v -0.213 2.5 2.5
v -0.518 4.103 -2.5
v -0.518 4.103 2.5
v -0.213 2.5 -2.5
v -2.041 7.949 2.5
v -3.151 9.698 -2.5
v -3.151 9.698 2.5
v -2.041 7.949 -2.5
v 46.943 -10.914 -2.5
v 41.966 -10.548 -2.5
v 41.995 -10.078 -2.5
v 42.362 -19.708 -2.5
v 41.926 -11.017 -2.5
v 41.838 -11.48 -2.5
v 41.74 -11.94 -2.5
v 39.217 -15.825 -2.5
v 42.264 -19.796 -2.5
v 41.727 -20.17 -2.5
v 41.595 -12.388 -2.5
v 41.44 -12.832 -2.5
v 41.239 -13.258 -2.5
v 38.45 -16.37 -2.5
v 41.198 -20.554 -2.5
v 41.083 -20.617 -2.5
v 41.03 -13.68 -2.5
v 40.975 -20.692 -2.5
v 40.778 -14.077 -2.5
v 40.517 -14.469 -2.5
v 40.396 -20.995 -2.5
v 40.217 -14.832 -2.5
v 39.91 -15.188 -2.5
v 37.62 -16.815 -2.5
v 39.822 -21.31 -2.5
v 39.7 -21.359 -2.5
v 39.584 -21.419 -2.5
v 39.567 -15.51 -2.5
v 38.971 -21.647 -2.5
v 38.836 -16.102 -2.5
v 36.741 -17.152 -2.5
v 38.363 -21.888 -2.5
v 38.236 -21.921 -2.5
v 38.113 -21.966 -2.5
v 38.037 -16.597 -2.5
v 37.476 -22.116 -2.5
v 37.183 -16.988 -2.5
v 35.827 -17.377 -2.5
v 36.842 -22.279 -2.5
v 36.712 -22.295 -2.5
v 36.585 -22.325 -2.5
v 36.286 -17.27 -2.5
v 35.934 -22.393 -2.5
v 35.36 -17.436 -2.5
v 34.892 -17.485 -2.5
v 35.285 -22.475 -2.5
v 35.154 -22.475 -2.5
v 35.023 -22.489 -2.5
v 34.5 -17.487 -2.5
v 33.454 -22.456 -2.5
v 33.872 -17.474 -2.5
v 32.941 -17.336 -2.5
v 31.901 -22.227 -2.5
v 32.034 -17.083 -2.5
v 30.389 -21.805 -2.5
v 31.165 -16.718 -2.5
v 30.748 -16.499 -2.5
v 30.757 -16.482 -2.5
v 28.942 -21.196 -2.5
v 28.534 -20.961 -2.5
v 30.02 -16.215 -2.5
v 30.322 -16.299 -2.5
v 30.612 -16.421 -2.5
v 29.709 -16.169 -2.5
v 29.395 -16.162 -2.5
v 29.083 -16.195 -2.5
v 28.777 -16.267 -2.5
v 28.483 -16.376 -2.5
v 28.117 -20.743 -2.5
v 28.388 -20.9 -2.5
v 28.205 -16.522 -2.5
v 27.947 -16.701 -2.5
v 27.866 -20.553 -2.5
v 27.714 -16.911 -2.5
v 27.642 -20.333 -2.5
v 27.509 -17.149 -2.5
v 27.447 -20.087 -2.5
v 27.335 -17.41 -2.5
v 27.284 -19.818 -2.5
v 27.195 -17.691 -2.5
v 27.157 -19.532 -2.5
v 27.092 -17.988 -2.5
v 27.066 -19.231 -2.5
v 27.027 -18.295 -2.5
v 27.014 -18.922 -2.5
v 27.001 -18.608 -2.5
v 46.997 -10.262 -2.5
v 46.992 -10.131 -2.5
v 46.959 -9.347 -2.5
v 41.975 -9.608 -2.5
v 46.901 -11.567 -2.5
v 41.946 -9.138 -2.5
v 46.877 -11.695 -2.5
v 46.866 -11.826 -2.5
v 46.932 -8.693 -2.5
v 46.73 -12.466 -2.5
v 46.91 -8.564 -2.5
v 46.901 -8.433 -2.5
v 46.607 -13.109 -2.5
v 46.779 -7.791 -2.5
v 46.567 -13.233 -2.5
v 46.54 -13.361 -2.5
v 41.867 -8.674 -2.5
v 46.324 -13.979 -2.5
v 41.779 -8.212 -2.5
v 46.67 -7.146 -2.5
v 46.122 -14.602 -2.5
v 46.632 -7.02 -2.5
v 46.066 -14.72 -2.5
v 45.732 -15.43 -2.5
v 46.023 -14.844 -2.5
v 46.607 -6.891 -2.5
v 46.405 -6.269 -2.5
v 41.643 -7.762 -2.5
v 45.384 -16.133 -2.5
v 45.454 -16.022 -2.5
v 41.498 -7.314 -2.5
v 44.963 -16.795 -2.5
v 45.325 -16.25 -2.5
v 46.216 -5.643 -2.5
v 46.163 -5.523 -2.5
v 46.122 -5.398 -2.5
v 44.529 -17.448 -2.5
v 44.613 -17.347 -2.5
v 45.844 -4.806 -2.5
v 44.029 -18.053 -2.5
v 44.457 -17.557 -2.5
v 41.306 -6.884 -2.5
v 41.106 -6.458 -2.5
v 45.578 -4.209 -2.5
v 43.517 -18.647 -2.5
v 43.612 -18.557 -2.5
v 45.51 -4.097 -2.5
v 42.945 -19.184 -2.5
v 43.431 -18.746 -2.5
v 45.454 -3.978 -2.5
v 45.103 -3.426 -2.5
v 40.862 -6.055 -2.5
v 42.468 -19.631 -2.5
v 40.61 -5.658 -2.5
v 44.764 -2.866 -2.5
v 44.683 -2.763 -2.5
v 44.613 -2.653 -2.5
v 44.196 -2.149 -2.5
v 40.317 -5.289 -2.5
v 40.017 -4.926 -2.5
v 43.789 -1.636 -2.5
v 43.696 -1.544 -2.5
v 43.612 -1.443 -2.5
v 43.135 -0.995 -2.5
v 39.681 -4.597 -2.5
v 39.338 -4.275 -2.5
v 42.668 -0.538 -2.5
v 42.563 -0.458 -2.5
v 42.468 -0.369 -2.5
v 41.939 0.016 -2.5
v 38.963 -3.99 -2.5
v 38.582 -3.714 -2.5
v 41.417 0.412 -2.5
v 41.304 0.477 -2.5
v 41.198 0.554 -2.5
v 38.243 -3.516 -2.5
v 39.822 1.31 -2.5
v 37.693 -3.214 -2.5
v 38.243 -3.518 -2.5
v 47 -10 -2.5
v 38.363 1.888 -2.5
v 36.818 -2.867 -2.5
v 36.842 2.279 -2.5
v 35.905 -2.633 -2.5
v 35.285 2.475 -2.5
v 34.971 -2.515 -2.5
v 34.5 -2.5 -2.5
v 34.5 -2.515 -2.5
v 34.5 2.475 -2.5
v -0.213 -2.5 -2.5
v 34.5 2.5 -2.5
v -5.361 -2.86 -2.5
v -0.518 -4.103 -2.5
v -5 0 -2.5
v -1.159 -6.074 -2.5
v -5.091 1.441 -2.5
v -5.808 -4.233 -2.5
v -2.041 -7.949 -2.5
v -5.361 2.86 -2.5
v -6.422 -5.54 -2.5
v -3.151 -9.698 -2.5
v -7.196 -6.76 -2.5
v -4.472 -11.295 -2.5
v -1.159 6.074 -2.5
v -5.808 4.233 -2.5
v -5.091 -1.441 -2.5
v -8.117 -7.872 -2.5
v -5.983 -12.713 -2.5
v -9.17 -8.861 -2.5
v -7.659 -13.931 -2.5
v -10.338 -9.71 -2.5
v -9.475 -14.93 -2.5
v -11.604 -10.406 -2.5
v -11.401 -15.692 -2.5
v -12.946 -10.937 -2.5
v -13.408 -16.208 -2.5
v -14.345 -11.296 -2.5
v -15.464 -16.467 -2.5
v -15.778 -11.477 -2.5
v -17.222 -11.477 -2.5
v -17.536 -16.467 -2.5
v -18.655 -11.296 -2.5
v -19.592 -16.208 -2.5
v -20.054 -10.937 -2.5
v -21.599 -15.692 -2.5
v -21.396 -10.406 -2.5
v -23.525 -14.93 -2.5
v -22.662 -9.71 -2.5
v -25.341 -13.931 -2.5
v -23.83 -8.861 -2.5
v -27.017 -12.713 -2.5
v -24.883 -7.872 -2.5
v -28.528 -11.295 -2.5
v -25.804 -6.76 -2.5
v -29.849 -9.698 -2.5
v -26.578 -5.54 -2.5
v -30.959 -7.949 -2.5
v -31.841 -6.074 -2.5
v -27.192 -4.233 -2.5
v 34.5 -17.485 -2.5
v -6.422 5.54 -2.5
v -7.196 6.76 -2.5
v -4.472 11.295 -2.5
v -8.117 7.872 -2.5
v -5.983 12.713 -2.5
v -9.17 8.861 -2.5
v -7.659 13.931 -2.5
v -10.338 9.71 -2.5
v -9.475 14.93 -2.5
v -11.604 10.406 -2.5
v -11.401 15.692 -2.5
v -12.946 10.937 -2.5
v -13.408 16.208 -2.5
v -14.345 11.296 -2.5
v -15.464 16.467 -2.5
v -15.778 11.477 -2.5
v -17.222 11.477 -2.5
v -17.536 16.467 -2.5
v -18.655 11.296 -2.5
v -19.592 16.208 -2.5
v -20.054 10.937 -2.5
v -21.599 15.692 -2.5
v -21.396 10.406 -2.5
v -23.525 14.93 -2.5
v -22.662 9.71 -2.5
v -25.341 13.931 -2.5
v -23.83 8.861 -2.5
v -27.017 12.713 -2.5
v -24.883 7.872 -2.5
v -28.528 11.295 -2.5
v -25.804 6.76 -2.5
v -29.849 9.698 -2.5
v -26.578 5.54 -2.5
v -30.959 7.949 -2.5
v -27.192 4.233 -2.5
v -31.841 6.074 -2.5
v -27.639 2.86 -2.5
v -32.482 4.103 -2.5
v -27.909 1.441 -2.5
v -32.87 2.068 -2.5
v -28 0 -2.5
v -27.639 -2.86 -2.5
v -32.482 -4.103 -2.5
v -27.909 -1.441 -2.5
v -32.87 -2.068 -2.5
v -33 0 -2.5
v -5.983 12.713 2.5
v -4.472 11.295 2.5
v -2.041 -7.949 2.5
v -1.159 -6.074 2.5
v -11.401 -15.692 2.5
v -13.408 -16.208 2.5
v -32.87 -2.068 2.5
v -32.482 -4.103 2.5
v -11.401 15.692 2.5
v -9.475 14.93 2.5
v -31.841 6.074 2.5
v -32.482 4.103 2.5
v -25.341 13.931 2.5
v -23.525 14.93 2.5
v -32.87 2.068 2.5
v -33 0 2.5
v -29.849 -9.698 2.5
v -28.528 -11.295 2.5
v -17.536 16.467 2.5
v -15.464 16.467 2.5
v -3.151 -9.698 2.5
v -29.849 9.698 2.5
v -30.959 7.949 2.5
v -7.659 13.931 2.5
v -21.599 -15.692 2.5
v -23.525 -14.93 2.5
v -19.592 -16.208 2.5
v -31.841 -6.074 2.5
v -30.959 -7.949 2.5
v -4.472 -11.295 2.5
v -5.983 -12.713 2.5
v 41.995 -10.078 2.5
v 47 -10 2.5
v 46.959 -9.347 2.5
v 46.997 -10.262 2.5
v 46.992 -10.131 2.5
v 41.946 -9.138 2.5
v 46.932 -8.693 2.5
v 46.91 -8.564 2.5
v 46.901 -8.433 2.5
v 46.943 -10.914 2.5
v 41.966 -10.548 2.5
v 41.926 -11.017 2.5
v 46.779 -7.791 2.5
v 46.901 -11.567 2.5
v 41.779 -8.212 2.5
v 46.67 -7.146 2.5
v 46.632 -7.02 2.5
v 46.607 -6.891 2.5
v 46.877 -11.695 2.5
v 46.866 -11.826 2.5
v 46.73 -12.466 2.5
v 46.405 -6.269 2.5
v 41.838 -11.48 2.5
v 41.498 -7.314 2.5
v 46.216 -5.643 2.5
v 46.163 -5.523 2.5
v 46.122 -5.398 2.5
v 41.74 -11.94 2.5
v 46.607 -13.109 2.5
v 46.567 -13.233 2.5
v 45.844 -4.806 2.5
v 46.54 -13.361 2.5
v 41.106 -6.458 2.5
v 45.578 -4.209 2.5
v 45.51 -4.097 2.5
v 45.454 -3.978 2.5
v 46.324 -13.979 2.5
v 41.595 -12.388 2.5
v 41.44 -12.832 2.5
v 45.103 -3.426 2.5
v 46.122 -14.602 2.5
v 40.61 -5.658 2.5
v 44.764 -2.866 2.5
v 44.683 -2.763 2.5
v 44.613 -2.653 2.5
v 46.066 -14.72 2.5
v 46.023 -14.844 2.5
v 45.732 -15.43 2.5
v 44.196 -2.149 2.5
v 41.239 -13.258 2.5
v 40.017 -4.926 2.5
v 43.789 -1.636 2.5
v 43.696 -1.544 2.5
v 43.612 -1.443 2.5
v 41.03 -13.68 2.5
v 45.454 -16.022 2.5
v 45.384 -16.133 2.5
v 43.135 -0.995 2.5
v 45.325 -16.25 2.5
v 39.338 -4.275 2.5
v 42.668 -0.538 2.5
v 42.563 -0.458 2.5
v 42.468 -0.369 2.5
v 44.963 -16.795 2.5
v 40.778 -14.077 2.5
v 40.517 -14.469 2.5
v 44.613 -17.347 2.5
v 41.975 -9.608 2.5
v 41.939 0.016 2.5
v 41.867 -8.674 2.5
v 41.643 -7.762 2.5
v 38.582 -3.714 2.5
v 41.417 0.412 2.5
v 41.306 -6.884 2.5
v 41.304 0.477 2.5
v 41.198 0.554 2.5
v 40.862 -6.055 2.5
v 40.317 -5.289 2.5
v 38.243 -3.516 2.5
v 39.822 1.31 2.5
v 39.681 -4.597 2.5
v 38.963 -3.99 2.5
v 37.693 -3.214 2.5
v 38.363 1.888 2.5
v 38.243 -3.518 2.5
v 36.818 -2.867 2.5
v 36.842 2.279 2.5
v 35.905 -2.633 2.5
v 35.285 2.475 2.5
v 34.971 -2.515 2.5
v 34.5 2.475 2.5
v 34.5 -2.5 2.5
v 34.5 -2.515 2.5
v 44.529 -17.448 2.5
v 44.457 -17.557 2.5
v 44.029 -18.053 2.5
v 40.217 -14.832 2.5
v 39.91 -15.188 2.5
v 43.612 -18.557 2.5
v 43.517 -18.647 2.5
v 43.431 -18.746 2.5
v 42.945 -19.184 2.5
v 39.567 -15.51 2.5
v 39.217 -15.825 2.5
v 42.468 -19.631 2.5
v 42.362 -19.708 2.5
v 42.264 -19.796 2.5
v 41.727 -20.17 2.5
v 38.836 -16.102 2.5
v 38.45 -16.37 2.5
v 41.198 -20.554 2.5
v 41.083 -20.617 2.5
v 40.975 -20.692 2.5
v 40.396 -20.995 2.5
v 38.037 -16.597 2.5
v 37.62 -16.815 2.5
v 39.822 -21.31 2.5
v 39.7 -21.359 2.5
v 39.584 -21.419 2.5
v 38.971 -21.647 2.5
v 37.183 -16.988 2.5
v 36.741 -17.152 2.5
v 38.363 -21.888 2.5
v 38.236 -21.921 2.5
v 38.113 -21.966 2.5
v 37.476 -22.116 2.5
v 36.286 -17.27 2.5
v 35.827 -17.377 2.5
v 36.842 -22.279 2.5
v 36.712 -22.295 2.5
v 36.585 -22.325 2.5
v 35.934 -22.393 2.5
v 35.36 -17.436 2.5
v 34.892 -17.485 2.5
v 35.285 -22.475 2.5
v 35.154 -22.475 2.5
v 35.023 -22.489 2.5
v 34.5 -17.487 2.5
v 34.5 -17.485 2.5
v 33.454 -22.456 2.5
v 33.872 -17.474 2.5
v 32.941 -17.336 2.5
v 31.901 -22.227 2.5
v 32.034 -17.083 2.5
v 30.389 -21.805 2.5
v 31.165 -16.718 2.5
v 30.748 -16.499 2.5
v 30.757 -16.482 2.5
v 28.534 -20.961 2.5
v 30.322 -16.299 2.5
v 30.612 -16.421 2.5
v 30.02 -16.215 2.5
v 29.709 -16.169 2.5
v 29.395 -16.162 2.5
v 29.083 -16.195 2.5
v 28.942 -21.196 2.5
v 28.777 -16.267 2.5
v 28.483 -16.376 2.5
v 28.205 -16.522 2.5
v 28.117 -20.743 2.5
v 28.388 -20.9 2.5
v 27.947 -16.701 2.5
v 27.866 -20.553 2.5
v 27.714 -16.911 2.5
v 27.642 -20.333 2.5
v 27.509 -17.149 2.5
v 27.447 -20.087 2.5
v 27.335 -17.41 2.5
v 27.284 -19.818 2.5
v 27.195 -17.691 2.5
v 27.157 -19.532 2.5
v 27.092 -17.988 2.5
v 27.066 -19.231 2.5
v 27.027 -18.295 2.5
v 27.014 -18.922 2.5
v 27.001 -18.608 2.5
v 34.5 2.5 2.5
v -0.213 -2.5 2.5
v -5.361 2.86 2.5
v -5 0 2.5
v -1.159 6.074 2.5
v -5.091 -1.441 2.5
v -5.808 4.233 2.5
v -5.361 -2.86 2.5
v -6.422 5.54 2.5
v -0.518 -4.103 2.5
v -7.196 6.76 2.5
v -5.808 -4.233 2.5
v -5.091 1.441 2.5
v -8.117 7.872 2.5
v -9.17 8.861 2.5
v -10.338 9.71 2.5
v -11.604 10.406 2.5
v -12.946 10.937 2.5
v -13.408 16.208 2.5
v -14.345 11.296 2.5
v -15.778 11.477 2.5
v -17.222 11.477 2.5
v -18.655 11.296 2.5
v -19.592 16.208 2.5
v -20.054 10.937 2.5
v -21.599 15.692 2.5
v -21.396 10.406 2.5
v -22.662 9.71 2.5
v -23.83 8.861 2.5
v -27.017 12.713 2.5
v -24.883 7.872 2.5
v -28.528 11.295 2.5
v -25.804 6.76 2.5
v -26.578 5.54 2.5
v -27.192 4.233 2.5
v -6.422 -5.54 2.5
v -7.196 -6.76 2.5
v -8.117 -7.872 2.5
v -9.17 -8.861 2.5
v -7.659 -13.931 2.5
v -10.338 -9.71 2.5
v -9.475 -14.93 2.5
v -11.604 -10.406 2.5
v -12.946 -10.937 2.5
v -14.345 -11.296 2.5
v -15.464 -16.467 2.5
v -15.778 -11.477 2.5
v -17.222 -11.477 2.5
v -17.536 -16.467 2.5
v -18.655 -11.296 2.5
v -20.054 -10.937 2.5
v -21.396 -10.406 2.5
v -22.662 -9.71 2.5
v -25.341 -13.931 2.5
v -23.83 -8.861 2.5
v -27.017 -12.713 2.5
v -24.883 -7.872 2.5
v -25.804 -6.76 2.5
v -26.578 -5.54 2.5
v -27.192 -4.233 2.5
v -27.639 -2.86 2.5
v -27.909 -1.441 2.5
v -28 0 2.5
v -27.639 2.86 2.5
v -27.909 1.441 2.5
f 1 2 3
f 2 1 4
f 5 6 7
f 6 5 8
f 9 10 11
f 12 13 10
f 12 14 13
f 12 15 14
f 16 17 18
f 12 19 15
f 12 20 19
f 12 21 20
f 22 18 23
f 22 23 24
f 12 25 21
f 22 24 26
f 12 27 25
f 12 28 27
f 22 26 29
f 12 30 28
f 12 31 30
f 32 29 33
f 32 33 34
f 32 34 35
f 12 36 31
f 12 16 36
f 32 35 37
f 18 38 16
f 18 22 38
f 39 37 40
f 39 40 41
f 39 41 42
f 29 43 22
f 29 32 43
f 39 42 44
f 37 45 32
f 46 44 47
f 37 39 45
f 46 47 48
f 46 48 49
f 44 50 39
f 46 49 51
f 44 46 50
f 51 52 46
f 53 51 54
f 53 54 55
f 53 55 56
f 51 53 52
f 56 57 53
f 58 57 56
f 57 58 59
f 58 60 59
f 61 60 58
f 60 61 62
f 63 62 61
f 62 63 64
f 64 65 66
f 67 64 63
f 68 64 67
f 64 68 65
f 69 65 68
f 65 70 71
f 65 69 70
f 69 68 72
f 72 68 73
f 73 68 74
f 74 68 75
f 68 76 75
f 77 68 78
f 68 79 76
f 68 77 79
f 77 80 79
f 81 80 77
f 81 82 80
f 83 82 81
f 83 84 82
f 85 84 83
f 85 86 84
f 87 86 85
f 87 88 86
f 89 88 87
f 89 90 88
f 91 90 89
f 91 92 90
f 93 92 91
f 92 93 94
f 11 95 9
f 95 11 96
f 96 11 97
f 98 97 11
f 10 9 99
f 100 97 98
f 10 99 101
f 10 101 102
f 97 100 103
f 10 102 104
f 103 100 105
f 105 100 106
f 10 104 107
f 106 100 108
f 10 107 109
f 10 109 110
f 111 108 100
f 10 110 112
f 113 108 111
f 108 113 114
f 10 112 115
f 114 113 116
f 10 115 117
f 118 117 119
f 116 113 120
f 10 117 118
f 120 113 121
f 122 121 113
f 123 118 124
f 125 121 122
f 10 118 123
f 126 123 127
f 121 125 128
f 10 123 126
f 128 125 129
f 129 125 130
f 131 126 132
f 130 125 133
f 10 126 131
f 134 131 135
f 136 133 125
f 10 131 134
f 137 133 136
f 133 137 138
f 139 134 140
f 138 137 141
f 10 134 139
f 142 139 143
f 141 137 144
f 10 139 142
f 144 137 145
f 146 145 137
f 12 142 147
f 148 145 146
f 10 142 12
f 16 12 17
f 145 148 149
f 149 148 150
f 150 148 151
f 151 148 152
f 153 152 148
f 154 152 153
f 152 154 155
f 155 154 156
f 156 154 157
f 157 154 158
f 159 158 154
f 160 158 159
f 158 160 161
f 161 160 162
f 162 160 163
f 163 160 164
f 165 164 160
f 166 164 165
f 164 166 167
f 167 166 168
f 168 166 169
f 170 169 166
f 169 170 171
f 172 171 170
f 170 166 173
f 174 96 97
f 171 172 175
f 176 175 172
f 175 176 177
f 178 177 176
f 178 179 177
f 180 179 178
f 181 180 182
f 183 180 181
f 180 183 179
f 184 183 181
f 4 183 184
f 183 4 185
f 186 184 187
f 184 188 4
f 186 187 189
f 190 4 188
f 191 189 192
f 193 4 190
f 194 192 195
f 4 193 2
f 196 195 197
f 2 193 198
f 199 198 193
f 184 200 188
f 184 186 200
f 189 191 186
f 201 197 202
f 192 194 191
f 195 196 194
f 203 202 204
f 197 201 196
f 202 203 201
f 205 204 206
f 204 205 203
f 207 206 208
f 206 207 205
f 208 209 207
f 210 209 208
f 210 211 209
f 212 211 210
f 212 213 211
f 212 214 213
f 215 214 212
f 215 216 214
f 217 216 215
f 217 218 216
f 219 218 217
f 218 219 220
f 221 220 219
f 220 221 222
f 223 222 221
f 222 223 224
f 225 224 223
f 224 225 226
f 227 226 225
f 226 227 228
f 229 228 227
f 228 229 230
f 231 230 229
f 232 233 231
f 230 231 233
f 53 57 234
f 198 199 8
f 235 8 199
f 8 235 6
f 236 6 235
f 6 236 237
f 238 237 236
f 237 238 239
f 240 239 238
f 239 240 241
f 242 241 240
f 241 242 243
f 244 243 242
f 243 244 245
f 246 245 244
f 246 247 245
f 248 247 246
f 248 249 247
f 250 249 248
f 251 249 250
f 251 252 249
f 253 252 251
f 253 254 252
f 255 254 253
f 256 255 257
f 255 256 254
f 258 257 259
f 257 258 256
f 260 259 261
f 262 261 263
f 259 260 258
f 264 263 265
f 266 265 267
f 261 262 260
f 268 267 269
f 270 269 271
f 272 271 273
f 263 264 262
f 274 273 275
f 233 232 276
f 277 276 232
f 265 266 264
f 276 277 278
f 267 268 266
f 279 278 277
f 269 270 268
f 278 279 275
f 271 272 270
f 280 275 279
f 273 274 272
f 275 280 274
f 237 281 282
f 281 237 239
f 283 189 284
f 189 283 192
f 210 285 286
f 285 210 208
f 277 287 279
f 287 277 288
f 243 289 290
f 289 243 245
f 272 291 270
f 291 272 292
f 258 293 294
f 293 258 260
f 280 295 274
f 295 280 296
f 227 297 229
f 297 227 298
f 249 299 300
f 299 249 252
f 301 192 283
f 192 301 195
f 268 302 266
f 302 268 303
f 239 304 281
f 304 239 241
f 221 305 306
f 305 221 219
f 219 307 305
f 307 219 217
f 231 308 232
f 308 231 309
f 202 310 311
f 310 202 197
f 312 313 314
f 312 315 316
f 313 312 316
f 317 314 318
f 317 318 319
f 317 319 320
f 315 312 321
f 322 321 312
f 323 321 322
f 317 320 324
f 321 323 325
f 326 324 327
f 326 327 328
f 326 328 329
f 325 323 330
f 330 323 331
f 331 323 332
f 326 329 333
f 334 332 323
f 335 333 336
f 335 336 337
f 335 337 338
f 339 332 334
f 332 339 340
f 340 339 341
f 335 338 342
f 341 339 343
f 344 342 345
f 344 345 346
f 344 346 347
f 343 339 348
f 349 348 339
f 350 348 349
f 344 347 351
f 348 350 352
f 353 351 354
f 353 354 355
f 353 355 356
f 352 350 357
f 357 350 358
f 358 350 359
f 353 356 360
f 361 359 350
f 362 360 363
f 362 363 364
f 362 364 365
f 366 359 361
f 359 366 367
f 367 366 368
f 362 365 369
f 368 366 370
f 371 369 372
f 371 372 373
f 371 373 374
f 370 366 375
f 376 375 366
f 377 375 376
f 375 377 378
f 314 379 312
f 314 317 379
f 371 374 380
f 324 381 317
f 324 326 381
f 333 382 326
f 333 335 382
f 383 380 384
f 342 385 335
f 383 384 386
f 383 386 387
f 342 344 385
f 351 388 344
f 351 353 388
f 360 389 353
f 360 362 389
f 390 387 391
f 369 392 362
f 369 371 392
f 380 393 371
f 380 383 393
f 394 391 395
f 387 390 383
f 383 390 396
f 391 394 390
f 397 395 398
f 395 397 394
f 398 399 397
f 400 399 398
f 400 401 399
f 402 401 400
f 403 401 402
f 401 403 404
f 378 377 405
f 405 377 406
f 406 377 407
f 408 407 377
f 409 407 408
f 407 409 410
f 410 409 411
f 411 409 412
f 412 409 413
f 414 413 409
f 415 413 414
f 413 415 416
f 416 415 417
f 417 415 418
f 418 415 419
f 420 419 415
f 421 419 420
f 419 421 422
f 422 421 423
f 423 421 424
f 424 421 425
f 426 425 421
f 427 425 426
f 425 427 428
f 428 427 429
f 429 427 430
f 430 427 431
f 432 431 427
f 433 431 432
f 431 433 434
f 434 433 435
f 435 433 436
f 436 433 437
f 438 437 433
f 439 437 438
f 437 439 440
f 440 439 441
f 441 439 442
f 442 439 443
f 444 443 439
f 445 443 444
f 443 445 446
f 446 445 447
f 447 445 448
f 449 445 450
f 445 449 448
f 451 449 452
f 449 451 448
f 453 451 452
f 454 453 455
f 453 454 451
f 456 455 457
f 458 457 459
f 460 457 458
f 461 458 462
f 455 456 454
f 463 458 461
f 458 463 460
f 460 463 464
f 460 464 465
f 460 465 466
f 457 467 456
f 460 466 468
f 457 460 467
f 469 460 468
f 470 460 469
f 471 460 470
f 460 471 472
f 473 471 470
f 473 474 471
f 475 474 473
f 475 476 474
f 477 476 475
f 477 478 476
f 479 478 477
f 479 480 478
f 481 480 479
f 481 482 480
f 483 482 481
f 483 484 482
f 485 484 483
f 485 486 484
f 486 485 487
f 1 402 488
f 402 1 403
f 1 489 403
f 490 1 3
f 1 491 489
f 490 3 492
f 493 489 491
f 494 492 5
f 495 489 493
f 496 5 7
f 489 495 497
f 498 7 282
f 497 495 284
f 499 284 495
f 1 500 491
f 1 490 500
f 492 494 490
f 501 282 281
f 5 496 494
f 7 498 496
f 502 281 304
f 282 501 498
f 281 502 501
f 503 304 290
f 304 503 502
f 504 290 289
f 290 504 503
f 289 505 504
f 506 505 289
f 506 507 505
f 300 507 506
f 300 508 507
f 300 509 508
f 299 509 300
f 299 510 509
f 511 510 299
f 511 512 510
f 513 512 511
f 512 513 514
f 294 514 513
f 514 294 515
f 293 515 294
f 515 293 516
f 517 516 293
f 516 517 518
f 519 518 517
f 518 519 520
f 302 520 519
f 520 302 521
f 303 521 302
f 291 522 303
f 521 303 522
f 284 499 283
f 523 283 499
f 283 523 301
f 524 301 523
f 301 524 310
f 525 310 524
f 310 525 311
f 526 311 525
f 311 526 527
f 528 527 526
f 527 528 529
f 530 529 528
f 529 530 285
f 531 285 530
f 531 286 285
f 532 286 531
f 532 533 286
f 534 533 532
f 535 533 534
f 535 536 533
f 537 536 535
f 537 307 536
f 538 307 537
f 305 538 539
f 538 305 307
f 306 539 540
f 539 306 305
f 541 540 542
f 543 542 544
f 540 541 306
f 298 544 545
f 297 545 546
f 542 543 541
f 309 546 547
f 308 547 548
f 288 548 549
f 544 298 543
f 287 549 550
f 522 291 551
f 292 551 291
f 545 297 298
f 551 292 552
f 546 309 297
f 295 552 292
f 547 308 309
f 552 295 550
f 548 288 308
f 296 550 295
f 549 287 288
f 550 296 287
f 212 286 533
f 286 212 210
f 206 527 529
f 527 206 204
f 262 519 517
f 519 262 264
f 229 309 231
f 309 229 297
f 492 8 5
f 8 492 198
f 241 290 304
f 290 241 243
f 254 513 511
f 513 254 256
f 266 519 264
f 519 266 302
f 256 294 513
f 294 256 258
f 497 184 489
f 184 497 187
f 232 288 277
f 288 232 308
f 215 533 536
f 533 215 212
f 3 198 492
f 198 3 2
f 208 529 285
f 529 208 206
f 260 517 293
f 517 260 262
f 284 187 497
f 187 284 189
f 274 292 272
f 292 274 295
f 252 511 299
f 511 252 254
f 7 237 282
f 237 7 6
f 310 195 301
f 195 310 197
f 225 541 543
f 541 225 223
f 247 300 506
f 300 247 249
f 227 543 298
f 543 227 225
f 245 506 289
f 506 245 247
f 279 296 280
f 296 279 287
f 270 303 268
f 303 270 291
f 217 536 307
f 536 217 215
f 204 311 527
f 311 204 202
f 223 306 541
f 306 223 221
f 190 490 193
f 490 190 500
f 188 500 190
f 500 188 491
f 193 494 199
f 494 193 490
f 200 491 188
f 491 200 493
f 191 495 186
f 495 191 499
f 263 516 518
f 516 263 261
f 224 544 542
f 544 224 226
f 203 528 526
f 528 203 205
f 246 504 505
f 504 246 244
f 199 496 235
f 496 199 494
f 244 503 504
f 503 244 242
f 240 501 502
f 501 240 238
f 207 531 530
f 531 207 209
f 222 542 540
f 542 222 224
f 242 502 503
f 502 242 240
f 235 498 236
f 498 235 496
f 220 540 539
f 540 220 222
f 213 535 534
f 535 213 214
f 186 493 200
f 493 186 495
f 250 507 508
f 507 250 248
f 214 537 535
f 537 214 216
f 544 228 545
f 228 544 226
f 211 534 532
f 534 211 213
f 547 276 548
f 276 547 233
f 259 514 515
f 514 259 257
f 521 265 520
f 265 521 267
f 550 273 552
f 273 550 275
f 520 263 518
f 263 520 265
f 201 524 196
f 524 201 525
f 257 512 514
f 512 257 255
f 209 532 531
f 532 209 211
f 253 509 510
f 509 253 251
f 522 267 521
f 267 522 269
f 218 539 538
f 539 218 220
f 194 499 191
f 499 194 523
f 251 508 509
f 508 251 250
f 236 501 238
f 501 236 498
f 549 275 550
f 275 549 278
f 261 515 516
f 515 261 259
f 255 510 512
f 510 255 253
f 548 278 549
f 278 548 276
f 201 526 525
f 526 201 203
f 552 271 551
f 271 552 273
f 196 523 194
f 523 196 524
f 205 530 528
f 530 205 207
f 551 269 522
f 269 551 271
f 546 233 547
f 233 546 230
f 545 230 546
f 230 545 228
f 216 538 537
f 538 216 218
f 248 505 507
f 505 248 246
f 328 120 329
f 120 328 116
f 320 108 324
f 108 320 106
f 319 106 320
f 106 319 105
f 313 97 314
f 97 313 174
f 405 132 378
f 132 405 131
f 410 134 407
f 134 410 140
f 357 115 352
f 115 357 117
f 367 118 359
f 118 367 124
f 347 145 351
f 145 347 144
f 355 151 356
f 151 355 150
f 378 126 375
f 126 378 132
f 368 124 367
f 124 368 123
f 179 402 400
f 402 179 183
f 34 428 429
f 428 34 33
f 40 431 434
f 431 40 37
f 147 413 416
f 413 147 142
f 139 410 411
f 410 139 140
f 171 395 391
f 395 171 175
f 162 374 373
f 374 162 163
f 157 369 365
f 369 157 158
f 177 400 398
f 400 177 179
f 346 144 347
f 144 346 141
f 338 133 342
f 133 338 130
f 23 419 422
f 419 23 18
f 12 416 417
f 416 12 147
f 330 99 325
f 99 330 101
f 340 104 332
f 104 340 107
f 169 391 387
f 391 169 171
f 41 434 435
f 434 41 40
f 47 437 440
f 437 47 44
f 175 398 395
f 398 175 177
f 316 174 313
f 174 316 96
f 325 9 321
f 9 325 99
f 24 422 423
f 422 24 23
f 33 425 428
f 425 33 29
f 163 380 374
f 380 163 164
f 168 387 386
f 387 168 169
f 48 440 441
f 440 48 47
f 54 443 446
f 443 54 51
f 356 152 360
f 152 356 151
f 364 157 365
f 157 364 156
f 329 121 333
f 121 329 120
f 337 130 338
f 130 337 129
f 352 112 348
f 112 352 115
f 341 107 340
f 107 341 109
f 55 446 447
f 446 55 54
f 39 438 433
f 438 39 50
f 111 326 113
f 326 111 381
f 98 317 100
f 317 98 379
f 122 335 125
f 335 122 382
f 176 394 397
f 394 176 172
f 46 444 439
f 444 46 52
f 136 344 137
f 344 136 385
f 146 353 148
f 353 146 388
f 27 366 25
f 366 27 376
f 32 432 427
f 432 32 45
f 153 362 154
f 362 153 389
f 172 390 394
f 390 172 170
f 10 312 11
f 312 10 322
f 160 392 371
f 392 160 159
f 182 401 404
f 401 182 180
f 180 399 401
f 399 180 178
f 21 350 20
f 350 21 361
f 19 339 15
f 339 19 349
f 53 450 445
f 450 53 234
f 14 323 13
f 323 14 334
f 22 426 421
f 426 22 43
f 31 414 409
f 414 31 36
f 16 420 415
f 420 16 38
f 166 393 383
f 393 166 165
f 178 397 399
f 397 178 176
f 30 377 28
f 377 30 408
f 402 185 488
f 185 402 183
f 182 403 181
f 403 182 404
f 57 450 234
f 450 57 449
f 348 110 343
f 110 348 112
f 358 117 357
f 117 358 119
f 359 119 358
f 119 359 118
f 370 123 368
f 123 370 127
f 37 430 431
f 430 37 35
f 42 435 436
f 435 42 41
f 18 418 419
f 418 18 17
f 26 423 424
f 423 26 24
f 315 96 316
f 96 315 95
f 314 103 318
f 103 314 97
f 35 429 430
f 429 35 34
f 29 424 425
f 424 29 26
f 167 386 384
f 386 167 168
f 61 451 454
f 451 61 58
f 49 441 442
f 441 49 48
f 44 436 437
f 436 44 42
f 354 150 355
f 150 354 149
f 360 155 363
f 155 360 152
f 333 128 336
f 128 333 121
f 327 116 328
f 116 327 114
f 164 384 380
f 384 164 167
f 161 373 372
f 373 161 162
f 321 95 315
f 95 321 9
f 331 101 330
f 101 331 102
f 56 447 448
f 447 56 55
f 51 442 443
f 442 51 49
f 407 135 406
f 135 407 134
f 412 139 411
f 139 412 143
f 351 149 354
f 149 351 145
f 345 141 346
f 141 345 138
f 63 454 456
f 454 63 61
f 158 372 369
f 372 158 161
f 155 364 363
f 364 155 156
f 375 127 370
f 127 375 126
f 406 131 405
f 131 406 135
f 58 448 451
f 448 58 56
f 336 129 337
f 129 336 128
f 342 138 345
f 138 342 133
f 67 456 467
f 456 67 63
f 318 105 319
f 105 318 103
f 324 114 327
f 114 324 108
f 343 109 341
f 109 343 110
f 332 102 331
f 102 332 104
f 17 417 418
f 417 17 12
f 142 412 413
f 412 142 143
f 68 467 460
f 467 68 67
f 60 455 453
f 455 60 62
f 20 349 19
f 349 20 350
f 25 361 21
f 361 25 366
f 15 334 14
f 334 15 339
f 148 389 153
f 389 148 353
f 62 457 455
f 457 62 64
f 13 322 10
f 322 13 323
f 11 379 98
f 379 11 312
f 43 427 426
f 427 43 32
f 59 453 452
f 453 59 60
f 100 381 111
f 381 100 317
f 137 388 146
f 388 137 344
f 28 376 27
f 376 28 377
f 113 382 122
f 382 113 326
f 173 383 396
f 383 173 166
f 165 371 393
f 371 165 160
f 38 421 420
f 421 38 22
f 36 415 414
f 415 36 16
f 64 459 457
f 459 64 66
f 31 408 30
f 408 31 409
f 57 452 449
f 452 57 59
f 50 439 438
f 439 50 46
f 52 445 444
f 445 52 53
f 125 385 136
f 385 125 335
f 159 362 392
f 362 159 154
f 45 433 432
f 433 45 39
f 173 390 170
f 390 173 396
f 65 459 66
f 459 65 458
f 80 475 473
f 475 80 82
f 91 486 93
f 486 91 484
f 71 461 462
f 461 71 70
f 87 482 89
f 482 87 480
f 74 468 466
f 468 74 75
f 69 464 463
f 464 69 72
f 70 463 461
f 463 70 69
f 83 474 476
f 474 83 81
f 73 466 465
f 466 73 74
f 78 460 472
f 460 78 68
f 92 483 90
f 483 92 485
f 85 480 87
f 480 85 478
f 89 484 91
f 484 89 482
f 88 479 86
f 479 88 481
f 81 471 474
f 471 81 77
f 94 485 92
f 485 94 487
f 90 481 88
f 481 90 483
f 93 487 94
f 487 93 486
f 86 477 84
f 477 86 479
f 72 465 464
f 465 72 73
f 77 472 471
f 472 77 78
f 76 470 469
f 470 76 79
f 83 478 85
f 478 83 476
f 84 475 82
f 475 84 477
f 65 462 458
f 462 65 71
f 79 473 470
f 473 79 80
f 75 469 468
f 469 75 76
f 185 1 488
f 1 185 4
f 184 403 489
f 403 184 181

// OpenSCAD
LOOP_DIA = 23;
HOOK_DIA = 15;
THICKNESS = 5;
LOOP_WIDTH = LOOP_DIA + 2 * THICKNESS;
HOOK_WIDTH = HOOK_DIA + 2 * THICKNESS;
HOOK_ANGLE = 210;
LENGTH = 80;

$fn = 50;

module loop(inner_dia, outer_dia, thickness) {
    difference() {
        cylinder(d = outer_dia, h = thickness, center = true);
        cylinder(d = inner_dia, h = thickness, center = true);
    }
}

module half_loop(inner_dia, outer_dia, thickness) {
    intersection() {
        loop(inner_dia, outer_dia, thickness);
        translate([outer_dia/2, 0, 0])
        cube(size = [outer_dia, outer_dia, 2* thickness], center = true);
    }
}

module hook(inner_dia, outer_dia, thickness, angle) {
    union() {
        rotate([0, 0, 180 - angle])
        union() {
            half_loop(inner_dia, outer_dia, thickness);
            translate([0, -(outer_dia+inner_dia)/4, 0])
            cylinder(d = thickness, h = thickness, center = true);
        }
        half_loop(inner_dia, outer_dia, thickness);
    }
}

union() {
    translate([-LOOP_WIDTH/2, 0, 0])
    loop(LOOP_DIA, LOOP_WIDTH, THICKNESS);
    
    bar_len = LENGTH-LOOP_WIDTH-HOOK_WIDTH/2;
    translate([bar_len, -(HOOK_DIA+THICKNESS)/2, 0])
    hook(HOOK_DIA, HOOK_WIDTH, THICKNESS, HOOK_ANGLE);
    
    translate([bar_len/2 - 1, 0, 0])
    cube(size = [bar_len + 2,THICKNESS, THICKNESS], center = true);
}
